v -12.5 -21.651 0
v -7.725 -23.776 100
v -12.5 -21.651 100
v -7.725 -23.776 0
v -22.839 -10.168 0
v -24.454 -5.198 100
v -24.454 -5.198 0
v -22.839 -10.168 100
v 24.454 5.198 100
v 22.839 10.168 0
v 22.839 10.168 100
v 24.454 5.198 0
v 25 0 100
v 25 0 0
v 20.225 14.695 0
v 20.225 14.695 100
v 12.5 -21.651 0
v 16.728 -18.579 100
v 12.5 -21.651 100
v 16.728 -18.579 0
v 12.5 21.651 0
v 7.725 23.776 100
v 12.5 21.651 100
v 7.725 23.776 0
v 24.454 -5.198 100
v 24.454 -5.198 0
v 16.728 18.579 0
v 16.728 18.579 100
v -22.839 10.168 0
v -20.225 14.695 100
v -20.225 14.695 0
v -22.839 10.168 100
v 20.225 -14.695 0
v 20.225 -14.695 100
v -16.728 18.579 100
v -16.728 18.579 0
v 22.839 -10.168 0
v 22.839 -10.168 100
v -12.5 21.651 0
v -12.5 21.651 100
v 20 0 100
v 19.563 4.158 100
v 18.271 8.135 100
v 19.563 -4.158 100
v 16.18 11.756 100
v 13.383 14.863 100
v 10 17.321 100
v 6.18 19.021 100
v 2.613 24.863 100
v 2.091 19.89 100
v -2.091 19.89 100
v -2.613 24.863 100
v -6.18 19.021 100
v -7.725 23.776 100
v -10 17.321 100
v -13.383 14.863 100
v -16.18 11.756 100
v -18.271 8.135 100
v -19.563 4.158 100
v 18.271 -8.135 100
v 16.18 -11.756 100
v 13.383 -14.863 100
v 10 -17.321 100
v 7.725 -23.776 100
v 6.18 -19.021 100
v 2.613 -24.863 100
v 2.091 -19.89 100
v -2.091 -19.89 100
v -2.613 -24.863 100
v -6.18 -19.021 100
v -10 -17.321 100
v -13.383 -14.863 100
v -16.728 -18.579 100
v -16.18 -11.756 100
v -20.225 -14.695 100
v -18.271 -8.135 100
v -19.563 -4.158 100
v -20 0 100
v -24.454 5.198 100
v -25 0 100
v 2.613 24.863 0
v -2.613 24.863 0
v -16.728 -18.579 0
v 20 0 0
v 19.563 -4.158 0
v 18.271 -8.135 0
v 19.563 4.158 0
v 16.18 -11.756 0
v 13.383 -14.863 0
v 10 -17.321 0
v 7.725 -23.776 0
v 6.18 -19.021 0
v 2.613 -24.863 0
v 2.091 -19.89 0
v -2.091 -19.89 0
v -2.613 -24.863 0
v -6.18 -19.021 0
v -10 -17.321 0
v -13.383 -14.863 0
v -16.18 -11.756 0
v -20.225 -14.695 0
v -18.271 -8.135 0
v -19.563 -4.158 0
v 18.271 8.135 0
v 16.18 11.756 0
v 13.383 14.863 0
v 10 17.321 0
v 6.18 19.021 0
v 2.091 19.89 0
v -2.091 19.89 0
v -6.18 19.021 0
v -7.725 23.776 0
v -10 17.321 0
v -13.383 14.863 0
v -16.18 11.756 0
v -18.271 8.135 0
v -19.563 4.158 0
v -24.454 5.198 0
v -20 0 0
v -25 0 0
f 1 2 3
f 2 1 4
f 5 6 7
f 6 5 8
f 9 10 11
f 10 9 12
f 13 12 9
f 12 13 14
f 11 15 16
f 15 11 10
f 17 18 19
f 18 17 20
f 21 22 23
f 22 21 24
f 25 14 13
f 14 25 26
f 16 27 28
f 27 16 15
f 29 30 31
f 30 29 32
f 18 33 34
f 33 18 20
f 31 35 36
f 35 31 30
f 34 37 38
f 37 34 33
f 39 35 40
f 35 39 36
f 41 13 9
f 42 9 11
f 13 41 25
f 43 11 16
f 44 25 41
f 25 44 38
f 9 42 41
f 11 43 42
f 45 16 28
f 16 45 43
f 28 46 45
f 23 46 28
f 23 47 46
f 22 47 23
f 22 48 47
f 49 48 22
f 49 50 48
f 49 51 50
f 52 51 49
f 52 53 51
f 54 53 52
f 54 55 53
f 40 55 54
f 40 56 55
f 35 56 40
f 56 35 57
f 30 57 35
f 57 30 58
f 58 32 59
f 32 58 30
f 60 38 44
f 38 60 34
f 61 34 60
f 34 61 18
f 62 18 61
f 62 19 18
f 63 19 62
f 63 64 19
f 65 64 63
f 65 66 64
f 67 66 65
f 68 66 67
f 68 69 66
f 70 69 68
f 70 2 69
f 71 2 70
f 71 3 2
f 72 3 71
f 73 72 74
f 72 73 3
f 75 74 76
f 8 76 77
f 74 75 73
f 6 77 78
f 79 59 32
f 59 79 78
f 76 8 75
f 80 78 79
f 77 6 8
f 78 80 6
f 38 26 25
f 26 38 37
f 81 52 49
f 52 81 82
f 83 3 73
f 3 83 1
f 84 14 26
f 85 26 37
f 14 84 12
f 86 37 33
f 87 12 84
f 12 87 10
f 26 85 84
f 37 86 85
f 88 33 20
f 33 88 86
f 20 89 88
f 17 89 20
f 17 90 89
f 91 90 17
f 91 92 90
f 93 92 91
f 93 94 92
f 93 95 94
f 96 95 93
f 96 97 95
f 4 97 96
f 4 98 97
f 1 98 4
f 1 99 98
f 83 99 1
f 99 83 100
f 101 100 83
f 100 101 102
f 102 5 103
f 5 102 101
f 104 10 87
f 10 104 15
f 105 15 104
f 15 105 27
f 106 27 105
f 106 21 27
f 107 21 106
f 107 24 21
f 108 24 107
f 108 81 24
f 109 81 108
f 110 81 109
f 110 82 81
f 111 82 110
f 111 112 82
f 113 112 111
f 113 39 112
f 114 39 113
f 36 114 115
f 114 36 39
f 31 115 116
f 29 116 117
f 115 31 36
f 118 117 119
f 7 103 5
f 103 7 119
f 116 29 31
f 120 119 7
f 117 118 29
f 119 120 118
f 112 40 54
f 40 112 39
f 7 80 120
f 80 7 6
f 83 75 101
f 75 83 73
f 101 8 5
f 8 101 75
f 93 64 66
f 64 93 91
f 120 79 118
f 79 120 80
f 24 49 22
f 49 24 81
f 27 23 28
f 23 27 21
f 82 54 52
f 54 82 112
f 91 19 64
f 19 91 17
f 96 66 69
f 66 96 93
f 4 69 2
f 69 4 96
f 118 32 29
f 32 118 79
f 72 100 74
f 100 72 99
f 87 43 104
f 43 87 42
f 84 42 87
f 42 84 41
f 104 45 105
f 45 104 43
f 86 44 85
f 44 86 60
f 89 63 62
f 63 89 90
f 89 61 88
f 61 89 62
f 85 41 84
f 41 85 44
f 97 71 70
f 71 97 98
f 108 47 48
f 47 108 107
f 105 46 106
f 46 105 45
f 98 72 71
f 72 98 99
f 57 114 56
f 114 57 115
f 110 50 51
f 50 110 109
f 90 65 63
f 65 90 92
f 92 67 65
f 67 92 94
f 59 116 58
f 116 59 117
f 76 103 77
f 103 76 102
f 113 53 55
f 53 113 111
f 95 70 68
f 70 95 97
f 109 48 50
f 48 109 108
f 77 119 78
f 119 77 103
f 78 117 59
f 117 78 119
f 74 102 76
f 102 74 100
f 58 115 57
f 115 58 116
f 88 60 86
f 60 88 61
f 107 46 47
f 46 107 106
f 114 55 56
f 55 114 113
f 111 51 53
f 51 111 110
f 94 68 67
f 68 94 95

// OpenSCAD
//Altura del tub
tub_mida = 100; // [1:500]

//Diametre del tub
tub_diametre = 50; // [1:100]

//Gruix de la pared del tub
tub_gruix = 5; // [1:100]

difference()
{
cylinder(r=tub_diametre/2,h=tub_mida);
cylinder(r=(tub_diametre/2)-tub_gruix,h=tub_mida);
}
